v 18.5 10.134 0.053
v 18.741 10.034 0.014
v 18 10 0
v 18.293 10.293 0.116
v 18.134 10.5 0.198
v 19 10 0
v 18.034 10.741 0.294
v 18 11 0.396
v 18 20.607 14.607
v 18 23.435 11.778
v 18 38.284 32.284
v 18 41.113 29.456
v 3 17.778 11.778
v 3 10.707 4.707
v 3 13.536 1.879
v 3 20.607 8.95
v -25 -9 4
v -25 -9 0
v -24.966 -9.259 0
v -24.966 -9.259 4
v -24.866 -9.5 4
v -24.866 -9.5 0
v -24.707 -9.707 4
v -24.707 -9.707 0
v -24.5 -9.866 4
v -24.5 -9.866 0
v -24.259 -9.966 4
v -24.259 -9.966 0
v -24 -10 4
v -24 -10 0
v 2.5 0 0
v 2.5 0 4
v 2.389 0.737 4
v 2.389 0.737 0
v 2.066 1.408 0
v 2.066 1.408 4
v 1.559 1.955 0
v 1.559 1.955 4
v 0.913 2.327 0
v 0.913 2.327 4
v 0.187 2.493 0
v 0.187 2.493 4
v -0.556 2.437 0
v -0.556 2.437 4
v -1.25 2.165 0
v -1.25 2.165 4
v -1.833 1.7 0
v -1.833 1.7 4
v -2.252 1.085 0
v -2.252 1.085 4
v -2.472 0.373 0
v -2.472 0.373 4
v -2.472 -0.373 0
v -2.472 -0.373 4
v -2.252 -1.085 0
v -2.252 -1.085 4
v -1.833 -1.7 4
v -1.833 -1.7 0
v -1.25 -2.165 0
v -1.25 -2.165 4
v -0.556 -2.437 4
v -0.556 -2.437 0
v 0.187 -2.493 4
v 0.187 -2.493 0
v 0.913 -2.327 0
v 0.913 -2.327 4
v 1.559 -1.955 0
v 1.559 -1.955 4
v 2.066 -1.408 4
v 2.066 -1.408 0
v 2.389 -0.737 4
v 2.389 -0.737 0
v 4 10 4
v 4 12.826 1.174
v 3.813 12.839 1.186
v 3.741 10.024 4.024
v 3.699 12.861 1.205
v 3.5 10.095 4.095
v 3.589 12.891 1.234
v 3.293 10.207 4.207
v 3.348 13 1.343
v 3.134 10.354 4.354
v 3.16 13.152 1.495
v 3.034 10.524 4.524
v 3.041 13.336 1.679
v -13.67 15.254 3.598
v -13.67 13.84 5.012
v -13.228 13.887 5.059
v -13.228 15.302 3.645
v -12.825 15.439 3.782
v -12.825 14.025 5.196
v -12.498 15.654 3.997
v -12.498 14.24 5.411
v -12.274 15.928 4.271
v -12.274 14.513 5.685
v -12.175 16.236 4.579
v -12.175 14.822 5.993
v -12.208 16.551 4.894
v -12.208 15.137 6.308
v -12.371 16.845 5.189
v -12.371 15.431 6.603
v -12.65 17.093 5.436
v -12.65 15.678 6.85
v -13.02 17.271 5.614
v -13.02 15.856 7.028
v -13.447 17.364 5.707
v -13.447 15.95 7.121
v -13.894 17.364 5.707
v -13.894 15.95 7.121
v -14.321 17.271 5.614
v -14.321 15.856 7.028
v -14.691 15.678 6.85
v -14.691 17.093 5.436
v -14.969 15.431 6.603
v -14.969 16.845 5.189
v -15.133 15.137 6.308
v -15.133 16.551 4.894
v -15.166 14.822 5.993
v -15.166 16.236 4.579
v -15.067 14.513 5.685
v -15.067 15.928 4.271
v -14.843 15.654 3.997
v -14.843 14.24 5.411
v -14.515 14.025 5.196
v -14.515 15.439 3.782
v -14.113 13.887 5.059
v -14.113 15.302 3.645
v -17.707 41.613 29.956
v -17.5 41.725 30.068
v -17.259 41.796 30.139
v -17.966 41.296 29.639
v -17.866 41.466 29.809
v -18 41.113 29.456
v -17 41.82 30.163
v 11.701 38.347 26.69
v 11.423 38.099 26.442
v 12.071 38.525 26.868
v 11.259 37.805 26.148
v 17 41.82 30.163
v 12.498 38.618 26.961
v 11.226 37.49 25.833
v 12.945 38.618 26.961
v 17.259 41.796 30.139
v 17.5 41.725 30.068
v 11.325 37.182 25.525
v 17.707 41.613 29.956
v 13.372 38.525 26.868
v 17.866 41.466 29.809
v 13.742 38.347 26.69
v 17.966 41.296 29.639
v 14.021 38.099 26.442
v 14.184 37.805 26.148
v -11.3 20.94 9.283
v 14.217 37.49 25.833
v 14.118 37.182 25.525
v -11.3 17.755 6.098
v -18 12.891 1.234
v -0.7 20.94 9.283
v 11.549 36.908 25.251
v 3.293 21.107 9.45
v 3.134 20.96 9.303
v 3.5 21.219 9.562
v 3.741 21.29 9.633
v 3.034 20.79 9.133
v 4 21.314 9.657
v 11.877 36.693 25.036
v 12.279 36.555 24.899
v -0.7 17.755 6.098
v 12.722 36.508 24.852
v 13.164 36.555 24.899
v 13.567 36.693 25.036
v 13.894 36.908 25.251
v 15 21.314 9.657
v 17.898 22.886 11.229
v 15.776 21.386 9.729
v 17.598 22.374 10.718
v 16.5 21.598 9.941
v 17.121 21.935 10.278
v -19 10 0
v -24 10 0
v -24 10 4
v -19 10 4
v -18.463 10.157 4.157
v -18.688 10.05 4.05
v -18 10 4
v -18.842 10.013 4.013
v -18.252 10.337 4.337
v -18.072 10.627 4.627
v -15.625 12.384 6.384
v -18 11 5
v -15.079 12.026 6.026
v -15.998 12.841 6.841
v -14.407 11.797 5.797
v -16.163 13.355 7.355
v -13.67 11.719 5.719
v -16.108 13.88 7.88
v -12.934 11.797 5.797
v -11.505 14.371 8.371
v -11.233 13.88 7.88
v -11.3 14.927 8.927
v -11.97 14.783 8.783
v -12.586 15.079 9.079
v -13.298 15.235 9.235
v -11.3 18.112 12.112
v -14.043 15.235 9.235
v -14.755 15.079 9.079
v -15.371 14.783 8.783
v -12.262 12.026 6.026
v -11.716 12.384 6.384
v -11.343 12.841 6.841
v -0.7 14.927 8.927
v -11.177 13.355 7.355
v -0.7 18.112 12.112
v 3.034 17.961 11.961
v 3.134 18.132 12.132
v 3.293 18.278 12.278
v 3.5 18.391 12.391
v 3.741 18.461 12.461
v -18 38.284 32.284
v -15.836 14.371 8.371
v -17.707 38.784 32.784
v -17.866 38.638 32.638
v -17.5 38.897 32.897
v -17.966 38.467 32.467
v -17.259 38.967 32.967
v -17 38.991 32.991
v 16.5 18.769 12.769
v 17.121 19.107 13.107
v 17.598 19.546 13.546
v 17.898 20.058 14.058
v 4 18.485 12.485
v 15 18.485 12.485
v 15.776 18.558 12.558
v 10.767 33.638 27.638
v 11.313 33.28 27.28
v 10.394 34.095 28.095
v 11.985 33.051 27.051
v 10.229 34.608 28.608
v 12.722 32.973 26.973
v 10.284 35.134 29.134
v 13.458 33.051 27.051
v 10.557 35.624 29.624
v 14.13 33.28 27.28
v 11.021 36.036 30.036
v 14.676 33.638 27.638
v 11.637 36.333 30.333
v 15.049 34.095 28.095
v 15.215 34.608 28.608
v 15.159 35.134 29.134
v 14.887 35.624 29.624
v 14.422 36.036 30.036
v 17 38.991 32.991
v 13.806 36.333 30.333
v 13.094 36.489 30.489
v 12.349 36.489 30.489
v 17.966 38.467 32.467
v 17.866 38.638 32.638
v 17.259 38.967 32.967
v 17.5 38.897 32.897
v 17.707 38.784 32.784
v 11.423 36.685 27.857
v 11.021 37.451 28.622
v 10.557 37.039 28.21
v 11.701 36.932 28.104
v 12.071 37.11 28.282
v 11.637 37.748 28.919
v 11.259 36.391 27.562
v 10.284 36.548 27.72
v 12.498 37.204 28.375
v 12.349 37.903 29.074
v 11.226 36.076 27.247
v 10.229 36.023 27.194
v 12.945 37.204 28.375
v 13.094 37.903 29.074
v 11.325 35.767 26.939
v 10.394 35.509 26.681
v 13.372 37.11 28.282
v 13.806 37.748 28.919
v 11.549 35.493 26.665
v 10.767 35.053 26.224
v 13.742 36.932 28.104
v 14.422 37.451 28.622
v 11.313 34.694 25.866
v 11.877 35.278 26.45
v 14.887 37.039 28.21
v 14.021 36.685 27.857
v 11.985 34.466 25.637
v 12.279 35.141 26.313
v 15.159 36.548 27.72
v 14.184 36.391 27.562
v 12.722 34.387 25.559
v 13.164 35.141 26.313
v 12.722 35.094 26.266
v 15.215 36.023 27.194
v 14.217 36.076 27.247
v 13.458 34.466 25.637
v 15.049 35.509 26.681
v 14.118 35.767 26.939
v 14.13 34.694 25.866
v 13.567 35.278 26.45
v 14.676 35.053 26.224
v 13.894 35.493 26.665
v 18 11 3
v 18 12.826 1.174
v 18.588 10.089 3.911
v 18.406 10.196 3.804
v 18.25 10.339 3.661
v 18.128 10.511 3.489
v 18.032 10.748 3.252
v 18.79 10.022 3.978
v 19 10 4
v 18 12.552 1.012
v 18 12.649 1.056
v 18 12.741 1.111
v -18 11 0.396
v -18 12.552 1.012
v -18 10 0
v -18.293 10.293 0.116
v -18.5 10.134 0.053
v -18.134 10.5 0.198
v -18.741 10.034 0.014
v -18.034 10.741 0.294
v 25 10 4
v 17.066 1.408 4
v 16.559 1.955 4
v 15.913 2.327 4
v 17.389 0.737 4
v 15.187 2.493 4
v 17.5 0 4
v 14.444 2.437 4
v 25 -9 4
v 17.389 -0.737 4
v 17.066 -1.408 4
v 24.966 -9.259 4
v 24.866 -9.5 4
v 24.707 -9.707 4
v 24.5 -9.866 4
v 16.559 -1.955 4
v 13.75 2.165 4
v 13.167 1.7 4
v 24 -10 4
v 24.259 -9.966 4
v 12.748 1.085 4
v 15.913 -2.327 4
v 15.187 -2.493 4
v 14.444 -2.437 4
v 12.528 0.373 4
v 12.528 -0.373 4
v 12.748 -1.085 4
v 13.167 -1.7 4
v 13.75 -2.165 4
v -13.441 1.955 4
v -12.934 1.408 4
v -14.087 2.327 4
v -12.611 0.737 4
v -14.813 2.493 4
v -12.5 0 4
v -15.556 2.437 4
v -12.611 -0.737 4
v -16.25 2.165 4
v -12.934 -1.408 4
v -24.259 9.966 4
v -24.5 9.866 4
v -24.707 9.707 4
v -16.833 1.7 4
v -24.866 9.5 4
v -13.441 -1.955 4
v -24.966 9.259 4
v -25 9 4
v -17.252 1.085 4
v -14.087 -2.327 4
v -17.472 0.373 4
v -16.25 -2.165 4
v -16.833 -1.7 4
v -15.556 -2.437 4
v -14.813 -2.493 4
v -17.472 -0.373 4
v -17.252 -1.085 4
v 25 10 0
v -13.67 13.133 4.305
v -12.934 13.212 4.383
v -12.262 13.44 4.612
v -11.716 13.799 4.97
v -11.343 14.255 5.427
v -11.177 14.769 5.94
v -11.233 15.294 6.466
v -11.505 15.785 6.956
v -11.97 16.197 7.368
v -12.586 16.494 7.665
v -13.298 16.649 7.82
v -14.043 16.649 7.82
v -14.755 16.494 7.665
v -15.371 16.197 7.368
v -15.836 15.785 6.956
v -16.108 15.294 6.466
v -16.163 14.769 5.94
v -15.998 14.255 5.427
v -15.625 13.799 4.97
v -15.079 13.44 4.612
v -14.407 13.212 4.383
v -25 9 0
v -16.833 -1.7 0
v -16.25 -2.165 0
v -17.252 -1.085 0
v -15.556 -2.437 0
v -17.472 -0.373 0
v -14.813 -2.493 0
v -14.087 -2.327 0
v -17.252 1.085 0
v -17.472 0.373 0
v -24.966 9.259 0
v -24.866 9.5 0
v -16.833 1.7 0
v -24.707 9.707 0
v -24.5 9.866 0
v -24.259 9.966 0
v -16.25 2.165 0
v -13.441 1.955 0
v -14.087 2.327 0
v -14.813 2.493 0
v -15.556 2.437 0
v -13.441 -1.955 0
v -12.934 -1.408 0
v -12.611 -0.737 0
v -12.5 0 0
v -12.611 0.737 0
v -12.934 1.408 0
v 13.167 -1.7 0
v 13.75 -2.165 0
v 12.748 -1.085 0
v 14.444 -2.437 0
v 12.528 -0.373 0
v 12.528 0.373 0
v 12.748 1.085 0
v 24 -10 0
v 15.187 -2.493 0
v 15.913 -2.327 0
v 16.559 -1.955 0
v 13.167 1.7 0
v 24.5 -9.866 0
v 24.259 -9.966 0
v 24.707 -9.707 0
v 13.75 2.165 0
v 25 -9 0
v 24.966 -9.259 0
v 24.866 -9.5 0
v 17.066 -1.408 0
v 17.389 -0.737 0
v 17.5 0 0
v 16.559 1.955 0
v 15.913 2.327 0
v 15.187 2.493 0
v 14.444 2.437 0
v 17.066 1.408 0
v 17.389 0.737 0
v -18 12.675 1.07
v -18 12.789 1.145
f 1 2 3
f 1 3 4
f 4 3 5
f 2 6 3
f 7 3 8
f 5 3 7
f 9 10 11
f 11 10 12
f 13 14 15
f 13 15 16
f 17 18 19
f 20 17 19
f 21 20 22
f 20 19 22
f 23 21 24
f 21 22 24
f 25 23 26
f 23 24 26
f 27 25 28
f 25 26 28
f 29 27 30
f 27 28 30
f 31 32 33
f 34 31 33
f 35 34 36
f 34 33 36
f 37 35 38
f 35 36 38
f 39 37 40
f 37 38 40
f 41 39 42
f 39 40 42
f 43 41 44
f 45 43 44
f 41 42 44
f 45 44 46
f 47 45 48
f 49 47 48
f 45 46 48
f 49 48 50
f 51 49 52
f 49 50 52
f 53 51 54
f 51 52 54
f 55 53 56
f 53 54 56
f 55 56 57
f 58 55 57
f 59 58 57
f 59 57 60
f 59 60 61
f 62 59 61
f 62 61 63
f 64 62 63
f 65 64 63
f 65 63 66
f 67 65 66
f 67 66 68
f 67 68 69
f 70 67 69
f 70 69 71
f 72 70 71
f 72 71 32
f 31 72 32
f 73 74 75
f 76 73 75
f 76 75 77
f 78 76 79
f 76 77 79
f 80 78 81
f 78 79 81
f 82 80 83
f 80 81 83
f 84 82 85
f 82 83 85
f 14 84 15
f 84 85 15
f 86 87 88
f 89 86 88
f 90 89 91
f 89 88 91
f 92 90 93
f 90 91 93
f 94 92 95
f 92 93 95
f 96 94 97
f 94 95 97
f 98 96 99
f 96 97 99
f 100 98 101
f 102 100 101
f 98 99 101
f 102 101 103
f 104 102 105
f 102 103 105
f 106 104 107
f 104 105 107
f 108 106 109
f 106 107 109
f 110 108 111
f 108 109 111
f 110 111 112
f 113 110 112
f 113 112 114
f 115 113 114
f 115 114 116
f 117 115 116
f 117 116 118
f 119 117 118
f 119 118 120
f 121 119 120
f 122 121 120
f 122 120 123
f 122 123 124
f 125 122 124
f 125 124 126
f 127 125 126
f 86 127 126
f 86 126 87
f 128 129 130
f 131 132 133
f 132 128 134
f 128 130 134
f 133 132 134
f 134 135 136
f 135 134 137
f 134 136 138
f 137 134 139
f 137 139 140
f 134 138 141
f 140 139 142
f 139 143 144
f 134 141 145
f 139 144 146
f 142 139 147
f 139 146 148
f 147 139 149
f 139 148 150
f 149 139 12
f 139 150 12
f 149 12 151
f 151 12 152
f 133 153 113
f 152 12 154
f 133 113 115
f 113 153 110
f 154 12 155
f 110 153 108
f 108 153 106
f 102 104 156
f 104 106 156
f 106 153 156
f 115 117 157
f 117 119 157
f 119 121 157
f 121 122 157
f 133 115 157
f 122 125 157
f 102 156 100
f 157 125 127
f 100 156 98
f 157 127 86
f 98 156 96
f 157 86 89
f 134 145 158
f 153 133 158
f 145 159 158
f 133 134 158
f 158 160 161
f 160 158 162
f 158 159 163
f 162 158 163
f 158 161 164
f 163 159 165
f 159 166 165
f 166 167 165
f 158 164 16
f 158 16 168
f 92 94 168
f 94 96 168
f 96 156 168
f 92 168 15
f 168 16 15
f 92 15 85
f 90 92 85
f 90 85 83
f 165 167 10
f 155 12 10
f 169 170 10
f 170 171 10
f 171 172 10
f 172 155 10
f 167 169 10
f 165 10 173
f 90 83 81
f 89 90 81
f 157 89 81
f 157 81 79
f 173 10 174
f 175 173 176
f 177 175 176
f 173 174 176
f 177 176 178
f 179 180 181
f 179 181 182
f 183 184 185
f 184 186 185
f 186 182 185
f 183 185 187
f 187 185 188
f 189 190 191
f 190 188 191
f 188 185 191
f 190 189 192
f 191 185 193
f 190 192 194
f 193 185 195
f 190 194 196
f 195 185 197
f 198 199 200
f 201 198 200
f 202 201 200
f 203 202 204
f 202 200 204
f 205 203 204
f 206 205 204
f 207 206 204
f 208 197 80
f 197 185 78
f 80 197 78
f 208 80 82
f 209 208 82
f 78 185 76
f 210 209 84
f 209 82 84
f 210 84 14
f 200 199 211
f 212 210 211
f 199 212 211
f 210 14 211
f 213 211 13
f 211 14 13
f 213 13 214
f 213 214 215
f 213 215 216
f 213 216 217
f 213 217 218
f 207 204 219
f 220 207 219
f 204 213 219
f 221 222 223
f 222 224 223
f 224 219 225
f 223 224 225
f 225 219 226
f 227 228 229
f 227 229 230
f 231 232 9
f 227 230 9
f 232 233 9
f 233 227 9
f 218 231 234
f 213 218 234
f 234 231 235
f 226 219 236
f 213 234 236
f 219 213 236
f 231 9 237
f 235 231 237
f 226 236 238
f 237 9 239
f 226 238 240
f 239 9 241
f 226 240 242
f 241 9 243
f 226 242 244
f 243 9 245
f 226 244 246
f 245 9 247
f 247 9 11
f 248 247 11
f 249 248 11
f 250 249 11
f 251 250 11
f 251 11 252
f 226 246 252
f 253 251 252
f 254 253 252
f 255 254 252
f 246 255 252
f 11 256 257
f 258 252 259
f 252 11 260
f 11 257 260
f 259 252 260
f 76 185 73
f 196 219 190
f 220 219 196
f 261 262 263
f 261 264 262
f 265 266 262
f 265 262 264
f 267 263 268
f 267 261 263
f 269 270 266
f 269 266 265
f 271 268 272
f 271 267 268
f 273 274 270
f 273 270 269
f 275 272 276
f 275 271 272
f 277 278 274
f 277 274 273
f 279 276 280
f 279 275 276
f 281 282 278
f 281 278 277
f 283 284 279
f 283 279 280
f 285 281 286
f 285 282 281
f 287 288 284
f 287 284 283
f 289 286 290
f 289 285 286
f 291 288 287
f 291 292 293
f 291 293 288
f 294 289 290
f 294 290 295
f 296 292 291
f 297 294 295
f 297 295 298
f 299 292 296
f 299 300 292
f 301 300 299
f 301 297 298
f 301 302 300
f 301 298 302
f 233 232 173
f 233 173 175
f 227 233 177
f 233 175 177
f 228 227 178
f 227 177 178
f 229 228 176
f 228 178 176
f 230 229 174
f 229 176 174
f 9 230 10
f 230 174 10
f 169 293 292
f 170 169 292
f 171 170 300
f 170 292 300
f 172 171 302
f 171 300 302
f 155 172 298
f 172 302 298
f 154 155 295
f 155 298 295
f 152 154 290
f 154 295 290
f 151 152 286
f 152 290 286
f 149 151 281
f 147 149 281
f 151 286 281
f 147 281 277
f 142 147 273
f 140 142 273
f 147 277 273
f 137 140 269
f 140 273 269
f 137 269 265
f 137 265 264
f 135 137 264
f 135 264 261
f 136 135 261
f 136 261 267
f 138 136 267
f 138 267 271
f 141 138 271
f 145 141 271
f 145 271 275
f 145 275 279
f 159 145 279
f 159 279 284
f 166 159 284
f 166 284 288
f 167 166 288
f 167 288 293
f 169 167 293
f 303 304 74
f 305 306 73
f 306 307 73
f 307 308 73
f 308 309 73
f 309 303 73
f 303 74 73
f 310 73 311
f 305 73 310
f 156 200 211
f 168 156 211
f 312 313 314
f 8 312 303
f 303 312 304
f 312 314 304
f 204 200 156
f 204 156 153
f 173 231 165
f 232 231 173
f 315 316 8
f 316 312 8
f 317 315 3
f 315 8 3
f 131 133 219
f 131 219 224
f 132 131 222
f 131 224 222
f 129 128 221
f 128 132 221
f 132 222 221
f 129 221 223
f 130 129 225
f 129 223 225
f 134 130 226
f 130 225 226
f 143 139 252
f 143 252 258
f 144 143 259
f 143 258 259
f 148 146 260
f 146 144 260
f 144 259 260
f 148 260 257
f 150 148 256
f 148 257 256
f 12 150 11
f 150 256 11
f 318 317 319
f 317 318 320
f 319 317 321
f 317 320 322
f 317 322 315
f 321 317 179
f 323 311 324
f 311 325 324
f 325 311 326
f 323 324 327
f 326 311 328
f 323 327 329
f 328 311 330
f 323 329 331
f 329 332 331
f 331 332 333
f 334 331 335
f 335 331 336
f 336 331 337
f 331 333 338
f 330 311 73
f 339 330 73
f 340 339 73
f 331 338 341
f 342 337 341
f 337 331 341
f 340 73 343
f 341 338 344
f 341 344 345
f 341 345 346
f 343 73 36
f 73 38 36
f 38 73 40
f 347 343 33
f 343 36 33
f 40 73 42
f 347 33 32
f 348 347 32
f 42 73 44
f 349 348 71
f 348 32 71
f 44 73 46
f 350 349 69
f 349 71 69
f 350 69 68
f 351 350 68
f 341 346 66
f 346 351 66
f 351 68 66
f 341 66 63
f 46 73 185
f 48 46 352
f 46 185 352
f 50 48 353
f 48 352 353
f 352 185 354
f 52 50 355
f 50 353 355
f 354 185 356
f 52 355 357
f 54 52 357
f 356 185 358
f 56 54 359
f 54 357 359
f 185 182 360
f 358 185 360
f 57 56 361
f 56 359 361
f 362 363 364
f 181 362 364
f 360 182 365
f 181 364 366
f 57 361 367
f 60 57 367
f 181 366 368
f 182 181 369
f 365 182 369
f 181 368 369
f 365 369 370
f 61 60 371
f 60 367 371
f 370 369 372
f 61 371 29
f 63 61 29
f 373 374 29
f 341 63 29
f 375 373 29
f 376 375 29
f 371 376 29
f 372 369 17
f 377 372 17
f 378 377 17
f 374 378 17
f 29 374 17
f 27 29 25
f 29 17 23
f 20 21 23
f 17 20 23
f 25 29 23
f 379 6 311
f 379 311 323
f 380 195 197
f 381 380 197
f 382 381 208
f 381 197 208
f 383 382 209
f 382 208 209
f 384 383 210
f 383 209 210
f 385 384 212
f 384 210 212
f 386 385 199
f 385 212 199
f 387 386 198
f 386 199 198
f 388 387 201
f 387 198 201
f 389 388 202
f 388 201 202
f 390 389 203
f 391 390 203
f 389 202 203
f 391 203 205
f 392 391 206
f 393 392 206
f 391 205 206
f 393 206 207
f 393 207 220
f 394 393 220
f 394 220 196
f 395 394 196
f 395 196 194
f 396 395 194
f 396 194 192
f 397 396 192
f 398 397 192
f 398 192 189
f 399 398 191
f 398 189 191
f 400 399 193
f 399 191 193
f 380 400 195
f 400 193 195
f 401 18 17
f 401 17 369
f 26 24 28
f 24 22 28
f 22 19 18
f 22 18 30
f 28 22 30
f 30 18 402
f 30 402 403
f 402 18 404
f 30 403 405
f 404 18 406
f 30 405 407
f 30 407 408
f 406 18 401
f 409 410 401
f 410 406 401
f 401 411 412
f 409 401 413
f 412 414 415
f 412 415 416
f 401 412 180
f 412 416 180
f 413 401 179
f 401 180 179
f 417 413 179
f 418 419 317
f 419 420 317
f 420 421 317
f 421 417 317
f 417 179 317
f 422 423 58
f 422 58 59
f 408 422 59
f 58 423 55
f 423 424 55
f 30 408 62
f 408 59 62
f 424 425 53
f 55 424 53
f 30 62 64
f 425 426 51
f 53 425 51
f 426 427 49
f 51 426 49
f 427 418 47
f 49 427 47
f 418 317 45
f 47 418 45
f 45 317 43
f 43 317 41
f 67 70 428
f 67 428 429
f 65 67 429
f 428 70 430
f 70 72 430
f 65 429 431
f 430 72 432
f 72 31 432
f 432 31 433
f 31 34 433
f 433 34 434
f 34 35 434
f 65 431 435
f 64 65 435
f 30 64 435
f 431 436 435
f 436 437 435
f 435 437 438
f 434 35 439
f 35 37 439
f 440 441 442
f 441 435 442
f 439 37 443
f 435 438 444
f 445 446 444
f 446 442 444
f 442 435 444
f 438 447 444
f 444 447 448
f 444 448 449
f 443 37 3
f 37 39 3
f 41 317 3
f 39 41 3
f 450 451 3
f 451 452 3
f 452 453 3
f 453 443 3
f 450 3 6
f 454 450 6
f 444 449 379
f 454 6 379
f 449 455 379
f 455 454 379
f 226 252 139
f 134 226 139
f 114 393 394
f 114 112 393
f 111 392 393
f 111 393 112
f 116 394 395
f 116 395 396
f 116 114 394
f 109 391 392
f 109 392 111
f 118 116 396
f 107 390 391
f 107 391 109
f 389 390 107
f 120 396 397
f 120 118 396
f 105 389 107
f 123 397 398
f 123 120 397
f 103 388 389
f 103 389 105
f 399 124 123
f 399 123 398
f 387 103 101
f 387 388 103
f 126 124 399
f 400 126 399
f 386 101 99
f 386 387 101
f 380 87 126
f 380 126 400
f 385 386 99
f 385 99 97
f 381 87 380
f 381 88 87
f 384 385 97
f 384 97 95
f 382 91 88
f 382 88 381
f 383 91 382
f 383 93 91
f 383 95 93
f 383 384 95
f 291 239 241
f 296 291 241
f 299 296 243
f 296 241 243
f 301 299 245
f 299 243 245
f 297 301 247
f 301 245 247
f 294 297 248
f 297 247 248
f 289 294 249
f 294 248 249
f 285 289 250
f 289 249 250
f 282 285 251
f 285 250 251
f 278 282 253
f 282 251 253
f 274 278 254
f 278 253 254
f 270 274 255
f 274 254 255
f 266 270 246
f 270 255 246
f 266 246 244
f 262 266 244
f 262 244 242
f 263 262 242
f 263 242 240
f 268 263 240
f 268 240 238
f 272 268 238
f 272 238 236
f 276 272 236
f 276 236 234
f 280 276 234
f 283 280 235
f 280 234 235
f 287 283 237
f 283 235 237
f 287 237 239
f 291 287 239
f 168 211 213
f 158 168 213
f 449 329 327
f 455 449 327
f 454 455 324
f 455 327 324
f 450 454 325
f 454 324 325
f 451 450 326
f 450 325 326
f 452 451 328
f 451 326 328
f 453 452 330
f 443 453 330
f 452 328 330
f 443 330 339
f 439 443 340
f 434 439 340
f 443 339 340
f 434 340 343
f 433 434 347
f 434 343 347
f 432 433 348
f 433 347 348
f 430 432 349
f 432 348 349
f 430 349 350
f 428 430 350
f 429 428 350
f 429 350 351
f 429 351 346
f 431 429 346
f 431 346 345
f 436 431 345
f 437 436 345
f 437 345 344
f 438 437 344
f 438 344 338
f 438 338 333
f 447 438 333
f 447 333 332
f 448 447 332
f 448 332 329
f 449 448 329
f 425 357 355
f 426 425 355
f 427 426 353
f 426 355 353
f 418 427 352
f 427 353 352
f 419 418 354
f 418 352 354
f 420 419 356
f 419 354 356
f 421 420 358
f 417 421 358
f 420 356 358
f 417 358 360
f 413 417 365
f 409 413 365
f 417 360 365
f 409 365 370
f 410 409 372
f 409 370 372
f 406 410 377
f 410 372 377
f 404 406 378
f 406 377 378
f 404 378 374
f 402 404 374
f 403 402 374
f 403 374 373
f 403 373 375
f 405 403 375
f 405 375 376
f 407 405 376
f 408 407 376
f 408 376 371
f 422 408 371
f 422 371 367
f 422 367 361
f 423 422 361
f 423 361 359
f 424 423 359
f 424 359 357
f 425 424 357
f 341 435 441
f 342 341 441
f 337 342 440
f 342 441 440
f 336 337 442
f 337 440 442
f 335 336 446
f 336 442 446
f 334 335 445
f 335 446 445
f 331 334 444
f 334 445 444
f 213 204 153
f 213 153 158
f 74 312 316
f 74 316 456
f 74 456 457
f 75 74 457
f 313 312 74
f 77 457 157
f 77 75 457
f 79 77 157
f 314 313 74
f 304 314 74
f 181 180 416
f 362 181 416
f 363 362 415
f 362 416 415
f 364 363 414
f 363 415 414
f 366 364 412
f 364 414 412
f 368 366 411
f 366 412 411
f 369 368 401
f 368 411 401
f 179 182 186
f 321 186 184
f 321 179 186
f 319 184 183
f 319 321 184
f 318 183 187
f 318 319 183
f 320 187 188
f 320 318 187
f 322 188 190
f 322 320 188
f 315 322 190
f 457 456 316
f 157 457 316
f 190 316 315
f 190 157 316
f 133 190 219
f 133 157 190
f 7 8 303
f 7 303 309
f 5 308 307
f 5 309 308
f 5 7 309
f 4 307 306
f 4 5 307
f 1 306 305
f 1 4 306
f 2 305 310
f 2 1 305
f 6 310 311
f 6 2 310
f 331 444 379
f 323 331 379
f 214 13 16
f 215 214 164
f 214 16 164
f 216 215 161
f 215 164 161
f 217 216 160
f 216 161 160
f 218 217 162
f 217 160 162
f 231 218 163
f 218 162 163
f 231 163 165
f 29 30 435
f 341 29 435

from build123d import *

# Parameters (mm, degrees)
SKETCH_1_W          = 50
SKETCH_1_H          = 20
EXTRUDE_1_DEPTH     = 4
EXTRUDE_2_DEPTH     = 18
SKETCH_5_R          = 1.5
CUT_EXTRUDE_1_DEPTH = 59.543629581
SKETCH_6_W          = 15
SKETCH_6_H          = 12
CUT_EXTRUDE_2_DEPTH = 59.543629581
FILLET_1_R          = 1
FILLET_2_R          = 1
FILLET_3_R          = 1
SKETCH_7_R          = 2.5
CUT_EXTRUDE_3_DEPTH = 2
SKETCH_8_R          = 2.5
CUT_EXTRUDE_4_DEPTH = 57.695644481
SKETCH_9_W          = 10.6
SKETCH_9_H          = 4.503957044
CUT_EXTRUDE_5_DEPTH = 10
FILLET_4_R          = 3


with BuildPart() as part:
    # 草图1 → 凸台-拉伸1 (new body)
    with BuildSketch(Plane.XY):
        Rectangle(SKETCH_1_W, SKETCH_1_H)
    extrude(amount=EXTRUDE_1_DEPTH)

    # 草图4 → 凸台-拉伸2 (add, symmetric)
    with BuildSketch(Plane(origin=(0, 0, 0), x_dir=(0, 0, -1), z_dir=(1, 0, 0))):
        Polygon((-4, 10), (-32.991378029, 38.991378029), (-30.162950904, 41.819805153), (-1.087902103, 12.744756352), (0, 10), align=None)
    extrude(amount=EXTRUDE_2_DEPTH, both=True)

    # 草图5 → 切除-拉伸1 (cut, through all)
    with BuildSketch(Plane(origin=(0, 3, -3), x_dir=(1, 0, 0), z_dir=(0, -0.7071067811865488, 0.7071067811865462))):
        with Locations(Location((12.721590614, 44.887973136, 0), (0, 0, 270))):
            Circle(SKETCH_5_R)
        with Locations(Location((-13.670456314, 14.830364134, 0), (0, 0, 270))):
            Circle(SKETCH_5_R)
    extrude(amount=-CUT_EXTRUDE_1_DEPTH, mode=Mode.SUBTRACT)

    # 草图6 → 切除-拉伸2 (cut, through all)
    with BuildSketch(Plane(origin=(0, 3, -3), x_dir=(1, 0, 0), z_dir=(0, -0.7071067811865488, 0.7071067811865462))):
        with Locations((10.5, 15.899494937)):
            Rectangle(SKETCH_6_W, SKETCH_6_H)
    extrude(amount=-CUT_EXTRUDE_2_DEPTH, mode=Mode.SUBTRACT)

    # 圆角1
    fillet_1_edges = [part.edges().sort_by_distance(p)[0] for p in [
        (3, 11.414213562, 2.585786438),
        (3, 19.899494937, 11.071067812),
    ]]
    fillet(fillet_1_edges, radius=FILLET_1_R)

    # 圆角2
    # the kernel refuses this fillet: 1 mm, written as the material it adds along each edge
    with BuildSketch(Plane(origin=(-18, 10, 0), x_dir=(0, 1, 0), z_dir=(0, 0, 1))) as fillet_2_piece_1_section:
        with BuildLine():
            CenterArc((FILLET_2_R, FILLET_2_R), FILLET_2_R, 180, 90)
            Line((0, FILLET_2_R), (0, 0))
            Line((0, 0), (FILLET_2_R, 0))
        make_face()
    fillet_2_piece_1 = extrude(amount=4, mode=Mode.PRIVATE)
    fillet_2_piece_1 = split(fillet_2_piece_1, bisect_by=Plane(origin=(-18.229103678, 9.132725648, 3.132725648), z_dir=(0, 0.7071067811865489, -0.7071067811865462)), keep=Keep.TOP, mode=Mode.PRIVATE)
    fillet_2_piece_1 = split(fillet_2_piece_1, bisect_by=Plane(origin=(-18.229103678, 10.891700331, 0.353431249), z_dir=(0, -0.36846891223412287, 0.9296400705203075)), keep=Keep.TOP, mode=Mode.PRIVATE)
    add(fillet_2_piece_1)
    with BuildSketch(Plane(origin=(-18, 10, 0), x_dir=(0, 1, 0), z_dir=(0, 0, 1))) as fillet_2_piece_2_section:
        with BuildLine():
            CenterArc((FILLET_2_R, FILLET_2_R), FILLET_2_R, 180, 90)
            Line((0, FILLET_2_R), (0, 0))
            Line((0, 0), (FILLET_2_R, 0))
        make_face()
    fillet_2_piece_2 = extrude(amount=6.5, mode=Mode.PRIVATE)
    fillet_2_piece_2 = split(fillet_2_piece_2, bisect_by=Plane(origin=(-18.106472513, 10.430118052, 4), z_dir=(0, 0, 1)), keep=Keep.TOP, mode=Mode.PRIVATE)
    fillet_2_piece_2 = split(fillet_2_piece_2, bisect_by=Plane(origin=(-18.106472513, 10.322588538, 4.322588538), z_dir=(0, 0.7071067811865489, -0.7071067811865462)), keep=Keep.TOP, mode=Mode.PRIVATE)
    add(fillet_2_piece_2)
    with BuildSketch(Plane(origin=(18, 10, 0), x_dir=(0, 1, 0), z_dir=(0, 0, 1))) as fillet_2_piece_3_section:
        with BuildLine():
            CenterArc((FILLET_2_R, -FILLET_2_R), FILLET_2_R, 90, 90)
            Line((0, -FILLET_2_R), (0, 0))
            Line((0, 0), (FILLET_2_R, 0))
        make_face()
    fillet_2_piece_3 = extrude(amount=4, mode=Mode.PRIVATE)
    fillet_2_piece_3 = split(fillet_2_piece_3, bisect_by=Plane(origin=(18.236725667, 10.843896017, 0.334483697), z_dir=(0, -0.36846891223412287, 0.9296400705203075)), keep=Keep.TOP, mode=Mode.PRIVATE)
    fillet_2_piece_3 = split(fillet_2_piece_3, bisect_by=Plane(origin=(18.236725667, 11.136071068, 2.863928932), z_dir=(0, -0.7071067811865462, -0.7071067811865489)), keep=Keep.TOP, mode=Mode.PRIVATE)
    add(fillet_2_piece_3)
    # the kernel refuses this fillet: 1 mm, written as the material it takes off along each edge
    with BuildSketch(Plane(origin=(-18, 37.223611076, 34.759144982), x_dir=(1, 0, 0), z_dir=(0, 0.7071067811865485, -0.7071067811865467)), Plane(origin=(18, 37.223611076, 34.759144982), x_dir=(0, -0.7071067811865467, -0.7071067811865485), z_dir=(0, 0.7071067811865485, -0.7071067811865467))) as fillet_2_2_piece_1:
        with BuildLine():
            CenterArc((FILLET_2_R, FILLET_2_R), FILLET_2_R, 180, 90)
            Line((0, FILLET_2_R), (0, 0))
            Line((0, 0), (FILLET_2_R, 0))
        make_face()
    extrude(amount=9, mode=Mode.SUBTRACT)
    with BuildSketch(Plane(origin=(-25, 10, -2.5), x_dir=(1, 0, 0), z_dir=(0, 0, 1)), Plane(origin=(25, -10, -2.5), x_dir=(-1, 0, 0), z_dir=(0, 0, 1)), Plane(origin=(-25, -10, -2.5), x_dir=(0, 1, 0), z_dir=(0, 0, 1))) as fillet_2_2_piece_2:
        with BuildLine():
            CenterArc((FILLET_2_R, -FILLET_2_R), FILLET_2_R, 90, 90)
            Line((0, -FILLET_2_R), (0, 0))
            Line((0, 0), (FILLET_2_R, 0))
        make_face()
    extrude(amount=9, mode=Mode.SUBTRACT)

    # 圆角3
    fillet_3_edges = [part.edges().sort_by_distance(p)[0] for p in [
        (0, 12.744756352, 1.087902103),
    ]]
    fillet(fillet_3_edges, radius=FILLET_3_R)

    # 草图7 → 切除-拉伸3 (cut)
    with BuildSketch(Plane(origin=(0, 3, -3), x_dir=(1, 0, 0), z_dir=(0, -0.7071067811865488, 0.7071067811865462))):
        with Locations(Location((12.721590614, 44.887973136, 0), (0, 0, 270))):
            Circle(SKETCH_7_R)
        with Locations(Location((-13.670456314, 14.830364134, 0), (0, 0, 270))):
            Circle(SKETCH_7_R)
    extrude(amount=-CUT_EXTRUDE_3_DEPTH, mode=Mode.SUBTRACT)

    # 草图8 → 切除-拉伸4 (cut, through all)
    with BuildSketch(Plane.XY.offset(4)):
        Circle(SKETCH_8_R)
        with Locations((15, 0)):
            Circle(SKETCH_8_R)
        with Locations((-15, 0)):
            Circle(SKETCH_8_R)
    extrude(amount=-CUT_EXTRUDE_4_DEPTH, mode=Mode.SUBTRACT)

    # 草图9 → 切除-拉伸5 (cut)
    with BuildSketch(Plane(origin=(0, 3, -3), x_dir=(1, 0, 0), z_dir=(0, -0.7071067811865488, 0.7071067811865462))):
        with Locations((-6, 19.119035577)):
            Rectangle(SKETCH_9_W, SKETCH_9_H)
    extrude(amount=-CUT_EXTRUDE_5_DEPTH, mode=Mode.SUBTRACT)

    # 圆角4
    fillet_4_edges = [part.edges().sort_by_distance(p)[0] for p in [
        (18, 19.899494937, 11.071067812),
    ]]
    fillet(fillet_4_edges, radius=FILLET_4_R)


solid = part.part
